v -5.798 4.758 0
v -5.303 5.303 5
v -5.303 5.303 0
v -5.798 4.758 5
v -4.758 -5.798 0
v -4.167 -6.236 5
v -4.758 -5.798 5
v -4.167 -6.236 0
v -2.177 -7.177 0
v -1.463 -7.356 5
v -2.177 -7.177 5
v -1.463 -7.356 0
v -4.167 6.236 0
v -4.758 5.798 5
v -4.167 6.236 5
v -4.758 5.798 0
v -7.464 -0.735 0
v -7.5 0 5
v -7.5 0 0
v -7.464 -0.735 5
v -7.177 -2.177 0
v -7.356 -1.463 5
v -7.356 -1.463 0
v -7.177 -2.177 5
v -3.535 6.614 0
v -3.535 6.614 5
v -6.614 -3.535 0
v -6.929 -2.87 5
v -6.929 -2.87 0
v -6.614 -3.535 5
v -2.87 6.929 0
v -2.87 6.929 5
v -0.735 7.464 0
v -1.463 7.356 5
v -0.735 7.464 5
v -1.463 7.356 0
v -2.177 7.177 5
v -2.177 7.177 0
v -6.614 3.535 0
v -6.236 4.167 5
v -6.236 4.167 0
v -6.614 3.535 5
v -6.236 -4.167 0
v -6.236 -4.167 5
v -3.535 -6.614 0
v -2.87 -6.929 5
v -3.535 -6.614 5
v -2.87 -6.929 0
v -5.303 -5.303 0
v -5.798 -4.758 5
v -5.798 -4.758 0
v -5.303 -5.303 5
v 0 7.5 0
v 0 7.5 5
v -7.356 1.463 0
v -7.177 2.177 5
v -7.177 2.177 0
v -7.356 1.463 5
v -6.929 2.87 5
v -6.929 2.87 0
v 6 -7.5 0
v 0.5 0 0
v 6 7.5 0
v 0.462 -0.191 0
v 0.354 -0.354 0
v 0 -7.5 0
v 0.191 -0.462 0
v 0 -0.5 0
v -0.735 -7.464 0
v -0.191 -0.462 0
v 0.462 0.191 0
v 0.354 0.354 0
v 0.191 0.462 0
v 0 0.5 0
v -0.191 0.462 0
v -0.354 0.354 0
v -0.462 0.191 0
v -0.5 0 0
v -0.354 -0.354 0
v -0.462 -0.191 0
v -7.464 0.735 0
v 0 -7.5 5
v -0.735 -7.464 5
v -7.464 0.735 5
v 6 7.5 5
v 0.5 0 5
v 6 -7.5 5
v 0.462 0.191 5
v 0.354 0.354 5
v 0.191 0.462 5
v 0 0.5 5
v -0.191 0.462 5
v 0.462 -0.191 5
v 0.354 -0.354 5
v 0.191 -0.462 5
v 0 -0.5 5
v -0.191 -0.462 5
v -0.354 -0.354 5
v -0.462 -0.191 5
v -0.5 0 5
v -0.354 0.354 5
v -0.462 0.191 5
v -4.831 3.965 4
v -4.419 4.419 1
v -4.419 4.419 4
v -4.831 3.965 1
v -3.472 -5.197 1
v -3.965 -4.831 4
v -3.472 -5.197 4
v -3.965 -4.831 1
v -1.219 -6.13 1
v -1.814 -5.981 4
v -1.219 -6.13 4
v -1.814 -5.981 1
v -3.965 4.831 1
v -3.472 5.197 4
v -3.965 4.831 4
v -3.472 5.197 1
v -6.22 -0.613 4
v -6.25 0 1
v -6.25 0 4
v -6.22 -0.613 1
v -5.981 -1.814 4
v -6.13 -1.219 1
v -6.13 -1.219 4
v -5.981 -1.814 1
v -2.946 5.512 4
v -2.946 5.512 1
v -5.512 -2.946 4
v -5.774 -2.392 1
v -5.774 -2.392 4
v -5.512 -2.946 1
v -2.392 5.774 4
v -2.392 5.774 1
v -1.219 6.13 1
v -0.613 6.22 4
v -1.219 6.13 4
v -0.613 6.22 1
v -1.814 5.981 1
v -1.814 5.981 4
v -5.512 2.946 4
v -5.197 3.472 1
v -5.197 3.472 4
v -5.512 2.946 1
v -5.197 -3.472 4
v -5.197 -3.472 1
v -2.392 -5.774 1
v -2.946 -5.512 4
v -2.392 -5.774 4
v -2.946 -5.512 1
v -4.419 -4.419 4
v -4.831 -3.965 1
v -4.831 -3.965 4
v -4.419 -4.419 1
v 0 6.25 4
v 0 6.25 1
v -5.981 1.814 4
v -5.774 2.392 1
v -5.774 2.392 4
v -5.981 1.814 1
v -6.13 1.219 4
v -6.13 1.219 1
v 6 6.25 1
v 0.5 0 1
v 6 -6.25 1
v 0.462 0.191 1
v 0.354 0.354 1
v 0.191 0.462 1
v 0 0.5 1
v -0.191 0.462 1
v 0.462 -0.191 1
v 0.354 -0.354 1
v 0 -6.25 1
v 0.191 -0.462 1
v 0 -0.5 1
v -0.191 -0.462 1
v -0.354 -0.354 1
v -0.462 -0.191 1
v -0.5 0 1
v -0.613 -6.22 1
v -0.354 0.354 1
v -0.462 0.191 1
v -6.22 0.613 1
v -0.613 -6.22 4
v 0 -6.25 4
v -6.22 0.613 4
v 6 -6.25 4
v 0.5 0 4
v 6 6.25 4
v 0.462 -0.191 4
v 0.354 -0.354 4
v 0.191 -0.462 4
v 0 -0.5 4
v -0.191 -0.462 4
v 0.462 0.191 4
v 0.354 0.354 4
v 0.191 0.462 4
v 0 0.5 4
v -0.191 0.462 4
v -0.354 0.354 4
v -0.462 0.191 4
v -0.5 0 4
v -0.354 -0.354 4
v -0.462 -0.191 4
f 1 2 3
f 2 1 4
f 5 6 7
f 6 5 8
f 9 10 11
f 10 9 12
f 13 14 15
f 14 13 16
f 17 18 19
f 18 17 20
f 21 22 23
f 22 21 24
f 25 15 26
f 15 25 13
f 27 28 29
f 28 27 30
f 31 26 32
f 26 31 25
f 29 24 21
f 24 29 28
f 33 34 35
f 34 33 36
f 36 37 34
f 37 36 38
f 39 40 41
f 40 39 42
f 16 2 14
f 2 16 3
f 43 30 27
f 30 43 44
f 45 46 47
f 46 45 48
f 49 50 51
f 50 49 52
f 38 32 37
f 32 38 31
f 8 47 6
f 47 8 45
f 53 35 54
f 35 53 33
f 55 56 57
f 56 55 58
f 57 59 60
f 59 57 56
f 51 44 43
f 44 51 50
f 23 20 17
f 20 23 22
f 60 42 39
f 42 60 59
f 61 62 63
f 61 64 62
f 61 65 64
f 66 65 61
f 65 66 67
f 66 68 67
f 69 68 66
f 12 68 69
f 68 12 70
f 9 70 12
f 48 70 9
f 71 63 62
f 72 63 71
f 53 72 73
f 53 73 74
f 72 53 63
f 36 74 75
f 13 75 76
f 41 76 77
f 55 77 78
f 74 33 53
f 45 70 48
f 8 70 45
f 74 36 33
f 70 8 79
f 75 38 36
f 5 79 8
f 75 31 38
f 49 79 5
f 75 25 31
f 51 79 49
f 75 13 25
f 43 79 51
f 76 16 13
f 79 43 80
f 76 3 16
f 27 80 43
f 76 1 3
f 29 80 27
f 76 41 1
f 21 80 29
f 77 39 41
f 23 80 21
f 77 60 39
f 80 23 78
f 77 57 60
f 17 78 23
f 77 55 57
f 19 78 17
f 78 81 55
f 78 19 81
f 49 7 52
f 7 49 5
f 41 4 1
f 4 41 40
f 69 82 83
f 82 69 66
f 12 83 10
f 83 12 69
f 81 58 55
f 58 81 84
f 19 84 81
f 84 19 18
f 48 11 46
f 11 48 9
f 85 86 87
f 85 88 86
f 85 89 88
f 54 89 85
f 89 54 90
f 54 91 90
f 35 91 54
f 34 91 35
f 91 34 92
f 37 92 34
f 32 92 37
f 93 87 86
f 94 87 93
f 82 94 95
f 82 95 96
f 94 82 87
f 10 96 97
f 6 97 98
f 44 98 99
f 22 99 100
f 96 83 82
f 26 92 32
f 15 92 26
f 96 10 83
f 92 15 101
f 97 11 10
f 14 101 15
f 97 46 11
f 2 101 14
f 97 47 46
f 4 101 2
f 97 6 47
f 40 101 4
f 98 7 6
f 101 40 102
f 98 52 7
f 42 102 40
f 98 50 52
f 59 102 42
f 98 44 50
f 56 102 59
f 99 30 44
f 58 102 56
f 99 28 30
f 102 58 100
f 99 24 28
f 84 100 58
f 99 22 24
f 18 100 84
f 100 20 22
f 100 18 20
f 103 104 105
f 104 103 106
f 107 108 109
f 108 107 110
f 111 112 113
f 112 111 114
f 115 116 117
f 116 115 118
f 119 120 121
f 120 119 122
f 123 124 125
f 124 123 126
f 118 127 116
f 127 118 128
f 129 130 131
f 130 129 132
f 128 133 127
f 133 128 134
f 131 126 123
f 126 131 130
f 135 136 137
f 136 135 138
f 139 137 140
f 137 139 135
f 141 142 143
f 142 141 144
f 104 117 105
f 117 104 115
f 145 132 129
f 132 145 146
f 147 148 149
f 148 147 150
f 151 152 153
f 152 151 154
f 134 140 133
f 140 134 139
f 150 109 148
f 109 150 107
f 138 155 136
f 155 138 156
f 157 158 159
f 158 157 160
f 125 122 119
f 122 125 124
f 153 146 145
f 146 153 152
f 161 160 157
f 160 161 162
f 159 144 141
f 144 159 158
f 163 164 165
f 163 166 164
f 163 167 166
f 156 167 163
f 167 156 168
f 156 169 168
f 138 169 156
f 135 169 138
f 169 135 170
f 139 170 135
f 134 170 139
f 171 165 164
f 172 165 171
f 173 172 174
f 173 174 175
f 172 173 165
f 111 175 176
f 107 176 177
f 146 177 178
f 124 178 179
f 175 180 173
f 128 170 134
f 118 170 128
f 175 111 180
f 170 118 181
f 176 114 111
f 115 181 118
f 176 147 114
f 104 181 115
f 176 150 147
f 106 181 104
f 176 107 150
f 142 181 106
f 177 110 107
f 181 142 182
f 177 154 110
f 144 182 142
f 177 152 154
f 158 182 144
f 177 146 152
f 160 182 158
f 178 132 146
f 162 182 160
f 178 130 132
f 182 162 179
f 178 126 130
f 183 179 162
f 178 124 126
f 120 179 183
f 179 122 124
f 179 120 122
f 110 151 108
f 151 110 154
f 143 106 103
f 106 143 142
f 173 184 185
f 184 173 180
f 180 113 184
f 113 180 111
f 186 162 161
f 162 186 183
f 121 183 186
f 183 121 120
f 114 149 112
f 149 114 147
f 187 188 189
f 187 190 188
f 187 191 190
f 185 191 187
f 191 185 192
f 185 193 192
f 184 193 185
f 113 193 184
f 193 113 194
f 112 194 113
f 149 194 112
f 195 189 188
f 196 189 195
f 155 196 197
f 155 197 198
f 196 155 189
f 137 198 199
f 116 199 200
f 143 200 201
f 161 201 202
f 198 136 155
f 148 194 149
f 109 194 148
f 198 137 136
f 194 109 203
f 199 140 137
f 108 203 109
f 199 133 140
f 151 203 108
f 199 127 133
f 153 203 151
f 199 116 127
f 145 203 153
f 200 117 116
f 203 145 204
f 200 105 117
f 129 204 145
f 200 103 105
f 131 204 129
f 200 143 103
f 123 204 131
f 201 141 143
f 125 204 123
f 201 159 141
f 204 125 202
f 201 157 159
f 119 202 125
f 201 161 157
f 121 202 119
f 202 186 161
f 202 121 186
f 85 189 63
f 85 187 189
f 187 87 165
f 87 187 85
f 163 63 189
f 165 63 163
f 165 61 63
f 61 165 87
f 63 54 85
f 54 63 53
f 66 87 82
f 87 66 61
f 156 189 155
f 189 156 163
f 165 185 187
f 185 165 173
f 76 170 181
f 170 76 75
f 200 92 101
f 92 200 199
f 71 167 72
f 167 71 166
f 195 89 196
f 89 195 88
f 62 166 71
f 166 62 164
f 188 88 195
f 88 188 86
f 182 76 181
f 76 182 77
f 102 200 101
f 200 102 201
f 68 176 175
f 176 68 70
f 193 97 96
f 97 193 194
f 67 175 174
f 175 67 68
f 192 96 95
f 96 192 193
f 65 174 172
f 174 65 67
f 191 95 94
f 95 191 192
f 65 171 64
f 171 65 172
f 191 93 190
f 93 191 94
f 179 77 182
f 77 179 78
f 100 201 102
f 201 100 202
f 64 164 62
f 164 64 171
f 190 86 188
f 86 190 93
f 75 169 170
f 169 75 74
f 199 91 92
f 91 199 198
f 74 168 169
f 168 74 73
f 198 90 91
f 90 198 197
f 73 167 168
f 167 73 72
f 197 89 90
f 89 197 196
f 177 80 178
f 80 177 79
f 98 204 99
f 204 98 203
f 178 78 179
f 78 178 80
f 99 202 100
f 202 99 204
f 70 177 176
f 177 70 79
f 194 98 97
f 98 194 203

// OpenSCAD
//Battery dimensions in mm

battery_diameter=12;
battery_height=2.5;
tolerance=0.5;
wall_thickness=1;
difference()
{
	union()
	{
		difference()
		{
			cylinder(r=(battery_diameter/2)+tolerance+wall_thickness, h=battery_height+(tolerance)+(2*wall_thickness),$fn=64);

			translate([0,0,wall_thickness])
			cylinder(r=(battery_diameter/2)+(tolerance/2), h=battery_height+(tolerance),$fn=64);
			translate([0,-((battery_diameter/2)+2+tolerance),0])
			cube([battery_diameter+10,battery_diameter+5,battery_height+5]);

		}

		difference()
		{
			translate([0,-((battery_diameter/2)+wall_thickness+tolerance),0])
			cube([battery_diameter/2,battery_diameter+(2*wall_thickness)+(2*tolerance),battery_height+(2*wall_thickness)+tolerance]);

			translate([0,-((battery_diameter/2))-(tolerance/2),wall_thickness])
			cube([battery_diameter+tolerance,battery_diameter+tolerance,battery_height+tolerance]);
		}
	}
	translate([0,0,-1])
	cylinder(r=0.5, h=battery_height+tolerance+10,$fn=16);
}
